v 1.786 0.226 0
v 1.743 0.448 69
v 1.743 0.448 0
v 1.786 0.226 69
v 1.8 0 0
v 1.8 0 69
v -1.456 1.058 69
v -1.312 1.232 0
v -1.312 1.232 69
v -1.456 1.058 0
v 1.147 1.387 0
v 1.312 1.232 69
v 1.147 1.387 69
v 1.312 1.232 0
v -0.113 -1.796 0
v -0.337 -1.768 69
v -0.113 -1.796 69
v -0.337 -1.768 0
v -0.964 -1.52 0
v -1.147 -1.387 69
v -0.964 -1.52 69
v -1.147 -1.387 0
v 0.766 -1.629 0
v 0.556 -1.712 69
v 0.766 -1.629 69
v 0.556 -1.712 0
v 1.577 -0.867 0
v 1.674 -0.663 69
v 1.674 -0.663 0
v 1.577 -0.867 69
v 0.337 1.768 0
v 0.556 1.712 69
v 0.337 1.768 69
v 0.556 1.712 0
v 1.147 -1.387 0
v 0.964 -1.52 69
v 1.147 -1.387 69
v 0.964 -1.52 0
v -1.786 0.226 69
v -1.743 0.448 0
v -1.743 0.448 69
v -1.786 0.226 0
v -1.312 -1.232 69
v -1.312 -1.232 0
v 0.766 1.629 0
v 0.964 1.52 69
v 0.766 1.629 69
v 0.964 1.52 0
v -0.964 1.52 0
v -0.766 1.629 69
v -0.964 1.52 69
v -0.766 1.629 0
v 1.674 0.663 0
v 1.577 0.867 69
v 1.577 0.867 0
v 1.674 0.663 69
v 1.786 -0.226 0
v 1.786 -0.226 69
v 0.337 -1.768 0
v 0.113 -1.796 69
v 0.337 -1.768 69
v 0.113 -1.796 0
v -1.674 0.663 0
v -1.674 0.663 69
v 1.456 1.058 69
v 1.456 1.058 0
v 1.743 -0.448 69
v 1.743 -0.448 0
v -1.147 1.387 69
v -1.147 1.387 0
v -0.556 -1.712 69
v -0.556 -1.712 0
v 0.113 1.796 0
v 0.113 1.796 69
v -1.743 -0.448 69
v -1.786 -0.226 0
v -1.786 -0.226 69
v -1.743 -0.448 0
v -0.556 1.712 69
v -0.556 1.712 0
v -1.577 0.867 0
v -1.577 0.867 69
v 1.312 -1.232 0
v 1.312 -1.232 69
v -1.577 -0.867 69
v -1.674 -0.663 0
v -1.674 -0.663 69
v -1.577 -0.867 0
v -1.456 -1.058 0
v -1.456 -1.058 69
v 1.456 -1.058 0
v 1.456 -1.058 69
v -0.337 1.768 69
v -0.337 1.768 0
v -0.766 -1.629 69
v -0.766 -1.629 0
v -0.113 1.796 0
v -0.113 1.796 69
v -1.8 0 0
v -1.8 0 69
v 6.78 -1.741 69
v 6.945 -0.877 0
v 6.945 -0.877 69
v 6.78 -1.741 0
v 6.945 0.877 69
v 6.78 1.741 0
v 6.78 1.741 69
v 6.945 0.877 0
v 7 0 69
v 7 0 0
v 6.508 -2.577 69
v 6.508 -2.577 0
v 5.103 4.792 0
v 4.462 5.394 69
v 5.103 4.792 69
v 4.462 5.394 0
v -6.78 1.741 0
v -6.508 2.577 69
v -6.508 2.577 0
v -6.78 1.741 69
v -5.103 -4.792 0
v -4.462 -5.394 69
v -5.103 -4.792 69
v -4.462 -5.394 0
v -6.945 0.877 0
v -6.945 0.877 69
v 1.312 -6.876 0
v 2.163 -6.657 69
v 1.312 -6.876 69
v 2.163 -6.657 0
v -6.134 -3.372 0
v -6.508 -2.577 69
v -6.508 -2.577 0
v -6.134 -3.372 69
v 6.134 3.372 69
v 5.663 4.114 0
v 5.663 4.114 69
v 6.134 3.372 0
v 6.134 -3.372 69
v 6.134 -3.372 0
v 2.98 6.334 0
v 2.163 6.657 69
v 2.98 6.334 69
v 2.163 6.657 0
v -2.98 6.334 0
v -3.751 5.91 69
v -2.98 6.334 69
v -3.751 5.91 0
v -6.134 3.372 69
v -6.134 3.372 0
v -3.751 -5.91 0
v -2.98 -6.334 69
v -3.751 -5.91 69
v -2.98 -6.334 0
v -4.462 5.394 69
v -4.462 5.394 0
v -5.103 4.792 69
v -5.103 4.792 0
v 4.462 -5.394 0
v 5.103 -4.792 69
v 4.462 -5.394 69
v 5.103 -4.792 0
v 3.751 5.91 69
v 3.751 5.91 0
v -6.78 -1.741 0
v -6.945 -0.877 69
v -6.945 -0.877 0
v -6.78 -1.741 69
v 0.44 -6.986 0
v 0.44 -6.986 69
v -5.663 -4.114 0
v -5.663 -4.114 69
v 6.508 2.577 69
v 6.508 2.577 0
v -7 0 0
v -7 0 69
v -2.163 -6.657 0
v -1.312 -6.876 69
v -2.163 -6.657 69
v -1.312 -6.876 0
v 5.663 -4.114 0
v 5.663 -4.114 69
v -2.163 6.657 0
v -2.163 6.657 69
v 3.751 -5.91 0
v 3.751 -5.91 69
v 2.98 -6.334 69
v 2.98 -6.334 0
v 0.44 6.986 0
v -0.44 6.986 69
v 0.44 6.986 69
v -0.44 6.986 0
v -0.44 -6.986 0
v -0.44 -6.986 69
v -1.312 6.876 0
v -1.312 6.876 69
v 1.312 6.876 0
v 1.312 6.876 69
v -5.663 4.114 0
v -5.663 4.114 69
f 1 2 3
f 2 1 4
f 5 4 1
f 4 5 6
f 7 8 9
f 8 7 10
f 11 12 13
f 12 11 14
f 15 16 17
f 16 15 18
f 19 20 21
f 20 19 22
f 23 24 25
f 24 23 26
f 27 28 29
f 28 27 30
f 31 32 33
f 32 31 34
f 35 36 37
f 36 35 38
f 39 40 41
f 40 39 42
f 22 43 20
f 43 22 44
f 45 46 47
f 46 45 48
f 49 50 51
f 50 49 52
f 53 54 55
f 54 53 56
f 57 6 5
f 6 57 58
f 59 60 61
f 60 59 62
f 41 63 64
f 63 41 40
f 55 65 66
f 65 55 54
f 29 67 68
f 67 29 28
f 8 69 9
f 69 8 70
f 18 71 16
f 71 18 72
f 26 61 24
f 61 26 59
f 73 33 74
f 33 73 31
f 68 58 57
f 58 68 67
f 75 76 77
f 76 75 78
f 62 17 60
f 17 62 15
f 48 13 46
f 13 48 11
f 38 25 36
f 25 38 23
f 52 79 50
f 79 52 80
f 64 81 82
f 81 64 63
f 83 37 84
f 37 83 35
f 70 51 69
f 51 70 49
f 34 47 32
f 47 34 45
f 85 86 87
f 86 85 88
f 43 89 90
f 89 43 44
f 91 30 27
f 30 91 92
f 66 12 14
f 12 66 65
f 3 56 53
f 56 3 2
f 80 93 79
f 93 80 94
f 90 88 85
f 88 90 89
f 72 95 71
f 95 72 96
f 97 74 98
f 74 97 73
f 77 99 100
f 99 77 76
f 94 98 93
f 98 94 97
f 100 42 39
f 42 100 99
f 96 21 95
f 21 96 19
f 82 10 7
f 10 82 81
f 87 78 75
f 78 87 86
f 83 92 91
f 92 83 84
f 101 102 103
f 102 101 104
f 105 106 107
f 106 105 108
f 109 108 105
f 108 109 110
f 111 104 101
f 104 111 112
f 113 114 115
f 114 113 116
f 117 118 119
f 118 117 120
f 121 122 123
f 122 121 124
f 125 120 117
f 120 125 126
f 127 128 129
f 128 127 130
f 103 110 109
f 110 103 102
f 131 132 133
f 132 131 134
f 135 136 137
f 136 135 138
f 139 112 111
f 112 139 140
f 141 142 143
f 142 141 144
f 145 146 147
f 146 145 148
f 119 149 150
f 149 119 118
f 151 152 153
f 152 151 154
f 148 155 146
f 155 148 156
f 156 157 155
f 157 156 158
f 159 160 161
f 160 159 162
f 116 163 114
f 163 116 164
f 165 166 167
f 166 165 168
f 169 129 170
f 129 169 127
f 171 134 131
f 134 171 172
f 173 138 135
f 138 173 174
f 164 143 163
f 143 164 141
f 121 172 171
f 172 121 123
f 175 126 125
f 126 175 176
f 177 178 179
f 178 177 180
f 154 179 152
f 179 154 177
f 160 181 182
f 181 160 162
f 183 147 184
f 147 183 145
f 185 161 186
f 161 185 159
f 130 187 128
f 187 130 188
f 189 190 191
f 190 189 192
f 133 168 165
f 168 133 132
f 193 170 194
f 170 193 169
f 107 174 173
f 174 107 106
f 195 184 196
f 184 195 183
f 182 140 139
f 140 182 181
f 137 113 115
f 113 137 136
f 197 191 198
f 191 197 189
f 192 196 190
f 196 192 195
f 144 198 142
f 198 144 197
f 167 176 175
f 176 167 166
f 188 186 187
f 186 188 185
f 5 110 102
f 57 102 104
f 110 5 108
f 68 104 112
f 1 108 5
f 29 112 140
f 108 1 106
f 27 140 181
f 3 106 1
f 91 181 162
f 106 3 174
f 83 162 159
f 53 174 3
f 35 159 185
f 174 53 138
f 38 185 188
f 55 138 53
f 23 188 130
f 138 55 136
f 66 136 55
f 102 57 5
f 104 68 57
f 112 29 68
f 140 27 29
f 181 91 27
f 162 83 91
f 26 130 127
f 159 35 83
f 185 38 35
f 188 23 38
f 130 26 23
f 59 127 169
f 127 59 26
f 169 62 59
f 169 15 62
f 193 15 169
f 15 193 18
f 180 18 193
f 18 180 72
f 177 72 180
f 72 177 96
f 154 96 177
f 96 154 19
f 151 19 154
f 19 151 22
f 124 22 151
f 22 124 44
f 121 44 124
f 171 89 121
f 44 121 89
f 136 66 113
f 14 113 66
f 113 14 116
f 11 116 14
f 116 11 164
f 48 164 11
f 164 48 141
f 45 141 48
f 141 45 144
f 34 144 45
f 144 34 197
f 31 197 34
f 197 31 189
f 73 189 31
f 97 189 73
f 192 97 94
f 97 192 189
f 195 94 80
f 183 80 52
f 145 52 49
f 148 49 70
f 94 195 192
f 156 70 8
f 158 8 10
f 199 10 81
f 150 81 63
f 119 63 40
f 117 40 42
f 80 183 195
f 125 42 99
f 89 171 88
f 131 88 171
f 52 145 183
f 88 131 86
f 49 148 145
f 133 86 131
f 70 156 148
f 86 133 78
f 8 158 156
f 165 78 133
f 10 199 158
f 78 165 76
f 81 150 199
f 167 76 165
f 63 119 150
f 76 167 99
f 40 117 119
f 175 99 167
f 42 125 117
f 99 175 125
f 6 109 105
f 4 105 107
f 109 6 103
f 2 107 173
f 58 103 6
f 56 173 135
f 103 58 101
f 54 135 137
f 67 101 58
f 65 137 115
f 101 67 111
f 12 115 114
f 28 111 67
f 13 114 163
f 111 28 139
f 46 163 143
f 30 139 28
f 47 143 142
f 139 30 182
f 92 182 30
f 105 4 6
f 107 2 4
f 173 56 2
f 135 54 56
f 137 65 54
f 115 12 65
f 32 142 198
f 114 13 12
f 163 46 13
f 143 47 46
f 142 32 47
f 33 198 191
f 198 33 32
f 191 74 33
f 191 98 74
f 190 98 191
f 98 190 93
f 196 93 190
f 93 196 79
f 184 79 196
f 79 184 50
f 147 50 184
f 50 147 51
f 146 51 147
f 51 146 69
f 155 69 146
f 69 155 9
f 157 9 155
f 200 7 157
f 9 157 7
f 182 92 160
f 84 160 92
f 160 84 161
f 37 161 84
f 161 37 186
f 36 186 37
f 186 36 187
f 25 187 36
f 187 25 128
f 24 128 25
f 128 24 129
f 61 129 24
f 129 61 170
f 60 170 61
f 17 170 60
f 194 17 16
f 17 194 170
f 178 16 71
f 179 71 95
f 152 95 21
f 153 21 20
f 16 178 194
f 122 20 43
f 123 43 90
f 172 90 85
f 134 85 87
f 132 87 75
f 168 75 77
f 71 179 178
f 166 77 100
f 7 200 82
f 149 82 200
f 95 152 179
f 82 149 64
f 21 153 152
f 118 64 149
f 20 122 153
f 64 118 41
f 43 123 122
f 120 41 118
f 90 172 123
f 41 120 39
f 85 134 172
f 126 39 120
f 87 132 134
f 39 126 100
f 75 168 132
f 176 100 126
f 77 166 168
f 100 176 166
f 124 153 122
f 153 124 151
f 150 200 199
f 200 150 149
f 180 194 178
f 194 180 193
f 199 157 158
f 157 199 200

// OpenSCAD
$fn = 50;


difference() {
	union() {
		cylinder(h = 69, r = 7.0000000000);
	}
	union() {
		translate(v = [0, 0, -100]) {
			cylinder(h = 200, r = 1.8000000000);
		}
		translate(v = [0, 0, -100]) {
			cylinder(h = 200, r = 1.8000000000);
		}
	}
}
